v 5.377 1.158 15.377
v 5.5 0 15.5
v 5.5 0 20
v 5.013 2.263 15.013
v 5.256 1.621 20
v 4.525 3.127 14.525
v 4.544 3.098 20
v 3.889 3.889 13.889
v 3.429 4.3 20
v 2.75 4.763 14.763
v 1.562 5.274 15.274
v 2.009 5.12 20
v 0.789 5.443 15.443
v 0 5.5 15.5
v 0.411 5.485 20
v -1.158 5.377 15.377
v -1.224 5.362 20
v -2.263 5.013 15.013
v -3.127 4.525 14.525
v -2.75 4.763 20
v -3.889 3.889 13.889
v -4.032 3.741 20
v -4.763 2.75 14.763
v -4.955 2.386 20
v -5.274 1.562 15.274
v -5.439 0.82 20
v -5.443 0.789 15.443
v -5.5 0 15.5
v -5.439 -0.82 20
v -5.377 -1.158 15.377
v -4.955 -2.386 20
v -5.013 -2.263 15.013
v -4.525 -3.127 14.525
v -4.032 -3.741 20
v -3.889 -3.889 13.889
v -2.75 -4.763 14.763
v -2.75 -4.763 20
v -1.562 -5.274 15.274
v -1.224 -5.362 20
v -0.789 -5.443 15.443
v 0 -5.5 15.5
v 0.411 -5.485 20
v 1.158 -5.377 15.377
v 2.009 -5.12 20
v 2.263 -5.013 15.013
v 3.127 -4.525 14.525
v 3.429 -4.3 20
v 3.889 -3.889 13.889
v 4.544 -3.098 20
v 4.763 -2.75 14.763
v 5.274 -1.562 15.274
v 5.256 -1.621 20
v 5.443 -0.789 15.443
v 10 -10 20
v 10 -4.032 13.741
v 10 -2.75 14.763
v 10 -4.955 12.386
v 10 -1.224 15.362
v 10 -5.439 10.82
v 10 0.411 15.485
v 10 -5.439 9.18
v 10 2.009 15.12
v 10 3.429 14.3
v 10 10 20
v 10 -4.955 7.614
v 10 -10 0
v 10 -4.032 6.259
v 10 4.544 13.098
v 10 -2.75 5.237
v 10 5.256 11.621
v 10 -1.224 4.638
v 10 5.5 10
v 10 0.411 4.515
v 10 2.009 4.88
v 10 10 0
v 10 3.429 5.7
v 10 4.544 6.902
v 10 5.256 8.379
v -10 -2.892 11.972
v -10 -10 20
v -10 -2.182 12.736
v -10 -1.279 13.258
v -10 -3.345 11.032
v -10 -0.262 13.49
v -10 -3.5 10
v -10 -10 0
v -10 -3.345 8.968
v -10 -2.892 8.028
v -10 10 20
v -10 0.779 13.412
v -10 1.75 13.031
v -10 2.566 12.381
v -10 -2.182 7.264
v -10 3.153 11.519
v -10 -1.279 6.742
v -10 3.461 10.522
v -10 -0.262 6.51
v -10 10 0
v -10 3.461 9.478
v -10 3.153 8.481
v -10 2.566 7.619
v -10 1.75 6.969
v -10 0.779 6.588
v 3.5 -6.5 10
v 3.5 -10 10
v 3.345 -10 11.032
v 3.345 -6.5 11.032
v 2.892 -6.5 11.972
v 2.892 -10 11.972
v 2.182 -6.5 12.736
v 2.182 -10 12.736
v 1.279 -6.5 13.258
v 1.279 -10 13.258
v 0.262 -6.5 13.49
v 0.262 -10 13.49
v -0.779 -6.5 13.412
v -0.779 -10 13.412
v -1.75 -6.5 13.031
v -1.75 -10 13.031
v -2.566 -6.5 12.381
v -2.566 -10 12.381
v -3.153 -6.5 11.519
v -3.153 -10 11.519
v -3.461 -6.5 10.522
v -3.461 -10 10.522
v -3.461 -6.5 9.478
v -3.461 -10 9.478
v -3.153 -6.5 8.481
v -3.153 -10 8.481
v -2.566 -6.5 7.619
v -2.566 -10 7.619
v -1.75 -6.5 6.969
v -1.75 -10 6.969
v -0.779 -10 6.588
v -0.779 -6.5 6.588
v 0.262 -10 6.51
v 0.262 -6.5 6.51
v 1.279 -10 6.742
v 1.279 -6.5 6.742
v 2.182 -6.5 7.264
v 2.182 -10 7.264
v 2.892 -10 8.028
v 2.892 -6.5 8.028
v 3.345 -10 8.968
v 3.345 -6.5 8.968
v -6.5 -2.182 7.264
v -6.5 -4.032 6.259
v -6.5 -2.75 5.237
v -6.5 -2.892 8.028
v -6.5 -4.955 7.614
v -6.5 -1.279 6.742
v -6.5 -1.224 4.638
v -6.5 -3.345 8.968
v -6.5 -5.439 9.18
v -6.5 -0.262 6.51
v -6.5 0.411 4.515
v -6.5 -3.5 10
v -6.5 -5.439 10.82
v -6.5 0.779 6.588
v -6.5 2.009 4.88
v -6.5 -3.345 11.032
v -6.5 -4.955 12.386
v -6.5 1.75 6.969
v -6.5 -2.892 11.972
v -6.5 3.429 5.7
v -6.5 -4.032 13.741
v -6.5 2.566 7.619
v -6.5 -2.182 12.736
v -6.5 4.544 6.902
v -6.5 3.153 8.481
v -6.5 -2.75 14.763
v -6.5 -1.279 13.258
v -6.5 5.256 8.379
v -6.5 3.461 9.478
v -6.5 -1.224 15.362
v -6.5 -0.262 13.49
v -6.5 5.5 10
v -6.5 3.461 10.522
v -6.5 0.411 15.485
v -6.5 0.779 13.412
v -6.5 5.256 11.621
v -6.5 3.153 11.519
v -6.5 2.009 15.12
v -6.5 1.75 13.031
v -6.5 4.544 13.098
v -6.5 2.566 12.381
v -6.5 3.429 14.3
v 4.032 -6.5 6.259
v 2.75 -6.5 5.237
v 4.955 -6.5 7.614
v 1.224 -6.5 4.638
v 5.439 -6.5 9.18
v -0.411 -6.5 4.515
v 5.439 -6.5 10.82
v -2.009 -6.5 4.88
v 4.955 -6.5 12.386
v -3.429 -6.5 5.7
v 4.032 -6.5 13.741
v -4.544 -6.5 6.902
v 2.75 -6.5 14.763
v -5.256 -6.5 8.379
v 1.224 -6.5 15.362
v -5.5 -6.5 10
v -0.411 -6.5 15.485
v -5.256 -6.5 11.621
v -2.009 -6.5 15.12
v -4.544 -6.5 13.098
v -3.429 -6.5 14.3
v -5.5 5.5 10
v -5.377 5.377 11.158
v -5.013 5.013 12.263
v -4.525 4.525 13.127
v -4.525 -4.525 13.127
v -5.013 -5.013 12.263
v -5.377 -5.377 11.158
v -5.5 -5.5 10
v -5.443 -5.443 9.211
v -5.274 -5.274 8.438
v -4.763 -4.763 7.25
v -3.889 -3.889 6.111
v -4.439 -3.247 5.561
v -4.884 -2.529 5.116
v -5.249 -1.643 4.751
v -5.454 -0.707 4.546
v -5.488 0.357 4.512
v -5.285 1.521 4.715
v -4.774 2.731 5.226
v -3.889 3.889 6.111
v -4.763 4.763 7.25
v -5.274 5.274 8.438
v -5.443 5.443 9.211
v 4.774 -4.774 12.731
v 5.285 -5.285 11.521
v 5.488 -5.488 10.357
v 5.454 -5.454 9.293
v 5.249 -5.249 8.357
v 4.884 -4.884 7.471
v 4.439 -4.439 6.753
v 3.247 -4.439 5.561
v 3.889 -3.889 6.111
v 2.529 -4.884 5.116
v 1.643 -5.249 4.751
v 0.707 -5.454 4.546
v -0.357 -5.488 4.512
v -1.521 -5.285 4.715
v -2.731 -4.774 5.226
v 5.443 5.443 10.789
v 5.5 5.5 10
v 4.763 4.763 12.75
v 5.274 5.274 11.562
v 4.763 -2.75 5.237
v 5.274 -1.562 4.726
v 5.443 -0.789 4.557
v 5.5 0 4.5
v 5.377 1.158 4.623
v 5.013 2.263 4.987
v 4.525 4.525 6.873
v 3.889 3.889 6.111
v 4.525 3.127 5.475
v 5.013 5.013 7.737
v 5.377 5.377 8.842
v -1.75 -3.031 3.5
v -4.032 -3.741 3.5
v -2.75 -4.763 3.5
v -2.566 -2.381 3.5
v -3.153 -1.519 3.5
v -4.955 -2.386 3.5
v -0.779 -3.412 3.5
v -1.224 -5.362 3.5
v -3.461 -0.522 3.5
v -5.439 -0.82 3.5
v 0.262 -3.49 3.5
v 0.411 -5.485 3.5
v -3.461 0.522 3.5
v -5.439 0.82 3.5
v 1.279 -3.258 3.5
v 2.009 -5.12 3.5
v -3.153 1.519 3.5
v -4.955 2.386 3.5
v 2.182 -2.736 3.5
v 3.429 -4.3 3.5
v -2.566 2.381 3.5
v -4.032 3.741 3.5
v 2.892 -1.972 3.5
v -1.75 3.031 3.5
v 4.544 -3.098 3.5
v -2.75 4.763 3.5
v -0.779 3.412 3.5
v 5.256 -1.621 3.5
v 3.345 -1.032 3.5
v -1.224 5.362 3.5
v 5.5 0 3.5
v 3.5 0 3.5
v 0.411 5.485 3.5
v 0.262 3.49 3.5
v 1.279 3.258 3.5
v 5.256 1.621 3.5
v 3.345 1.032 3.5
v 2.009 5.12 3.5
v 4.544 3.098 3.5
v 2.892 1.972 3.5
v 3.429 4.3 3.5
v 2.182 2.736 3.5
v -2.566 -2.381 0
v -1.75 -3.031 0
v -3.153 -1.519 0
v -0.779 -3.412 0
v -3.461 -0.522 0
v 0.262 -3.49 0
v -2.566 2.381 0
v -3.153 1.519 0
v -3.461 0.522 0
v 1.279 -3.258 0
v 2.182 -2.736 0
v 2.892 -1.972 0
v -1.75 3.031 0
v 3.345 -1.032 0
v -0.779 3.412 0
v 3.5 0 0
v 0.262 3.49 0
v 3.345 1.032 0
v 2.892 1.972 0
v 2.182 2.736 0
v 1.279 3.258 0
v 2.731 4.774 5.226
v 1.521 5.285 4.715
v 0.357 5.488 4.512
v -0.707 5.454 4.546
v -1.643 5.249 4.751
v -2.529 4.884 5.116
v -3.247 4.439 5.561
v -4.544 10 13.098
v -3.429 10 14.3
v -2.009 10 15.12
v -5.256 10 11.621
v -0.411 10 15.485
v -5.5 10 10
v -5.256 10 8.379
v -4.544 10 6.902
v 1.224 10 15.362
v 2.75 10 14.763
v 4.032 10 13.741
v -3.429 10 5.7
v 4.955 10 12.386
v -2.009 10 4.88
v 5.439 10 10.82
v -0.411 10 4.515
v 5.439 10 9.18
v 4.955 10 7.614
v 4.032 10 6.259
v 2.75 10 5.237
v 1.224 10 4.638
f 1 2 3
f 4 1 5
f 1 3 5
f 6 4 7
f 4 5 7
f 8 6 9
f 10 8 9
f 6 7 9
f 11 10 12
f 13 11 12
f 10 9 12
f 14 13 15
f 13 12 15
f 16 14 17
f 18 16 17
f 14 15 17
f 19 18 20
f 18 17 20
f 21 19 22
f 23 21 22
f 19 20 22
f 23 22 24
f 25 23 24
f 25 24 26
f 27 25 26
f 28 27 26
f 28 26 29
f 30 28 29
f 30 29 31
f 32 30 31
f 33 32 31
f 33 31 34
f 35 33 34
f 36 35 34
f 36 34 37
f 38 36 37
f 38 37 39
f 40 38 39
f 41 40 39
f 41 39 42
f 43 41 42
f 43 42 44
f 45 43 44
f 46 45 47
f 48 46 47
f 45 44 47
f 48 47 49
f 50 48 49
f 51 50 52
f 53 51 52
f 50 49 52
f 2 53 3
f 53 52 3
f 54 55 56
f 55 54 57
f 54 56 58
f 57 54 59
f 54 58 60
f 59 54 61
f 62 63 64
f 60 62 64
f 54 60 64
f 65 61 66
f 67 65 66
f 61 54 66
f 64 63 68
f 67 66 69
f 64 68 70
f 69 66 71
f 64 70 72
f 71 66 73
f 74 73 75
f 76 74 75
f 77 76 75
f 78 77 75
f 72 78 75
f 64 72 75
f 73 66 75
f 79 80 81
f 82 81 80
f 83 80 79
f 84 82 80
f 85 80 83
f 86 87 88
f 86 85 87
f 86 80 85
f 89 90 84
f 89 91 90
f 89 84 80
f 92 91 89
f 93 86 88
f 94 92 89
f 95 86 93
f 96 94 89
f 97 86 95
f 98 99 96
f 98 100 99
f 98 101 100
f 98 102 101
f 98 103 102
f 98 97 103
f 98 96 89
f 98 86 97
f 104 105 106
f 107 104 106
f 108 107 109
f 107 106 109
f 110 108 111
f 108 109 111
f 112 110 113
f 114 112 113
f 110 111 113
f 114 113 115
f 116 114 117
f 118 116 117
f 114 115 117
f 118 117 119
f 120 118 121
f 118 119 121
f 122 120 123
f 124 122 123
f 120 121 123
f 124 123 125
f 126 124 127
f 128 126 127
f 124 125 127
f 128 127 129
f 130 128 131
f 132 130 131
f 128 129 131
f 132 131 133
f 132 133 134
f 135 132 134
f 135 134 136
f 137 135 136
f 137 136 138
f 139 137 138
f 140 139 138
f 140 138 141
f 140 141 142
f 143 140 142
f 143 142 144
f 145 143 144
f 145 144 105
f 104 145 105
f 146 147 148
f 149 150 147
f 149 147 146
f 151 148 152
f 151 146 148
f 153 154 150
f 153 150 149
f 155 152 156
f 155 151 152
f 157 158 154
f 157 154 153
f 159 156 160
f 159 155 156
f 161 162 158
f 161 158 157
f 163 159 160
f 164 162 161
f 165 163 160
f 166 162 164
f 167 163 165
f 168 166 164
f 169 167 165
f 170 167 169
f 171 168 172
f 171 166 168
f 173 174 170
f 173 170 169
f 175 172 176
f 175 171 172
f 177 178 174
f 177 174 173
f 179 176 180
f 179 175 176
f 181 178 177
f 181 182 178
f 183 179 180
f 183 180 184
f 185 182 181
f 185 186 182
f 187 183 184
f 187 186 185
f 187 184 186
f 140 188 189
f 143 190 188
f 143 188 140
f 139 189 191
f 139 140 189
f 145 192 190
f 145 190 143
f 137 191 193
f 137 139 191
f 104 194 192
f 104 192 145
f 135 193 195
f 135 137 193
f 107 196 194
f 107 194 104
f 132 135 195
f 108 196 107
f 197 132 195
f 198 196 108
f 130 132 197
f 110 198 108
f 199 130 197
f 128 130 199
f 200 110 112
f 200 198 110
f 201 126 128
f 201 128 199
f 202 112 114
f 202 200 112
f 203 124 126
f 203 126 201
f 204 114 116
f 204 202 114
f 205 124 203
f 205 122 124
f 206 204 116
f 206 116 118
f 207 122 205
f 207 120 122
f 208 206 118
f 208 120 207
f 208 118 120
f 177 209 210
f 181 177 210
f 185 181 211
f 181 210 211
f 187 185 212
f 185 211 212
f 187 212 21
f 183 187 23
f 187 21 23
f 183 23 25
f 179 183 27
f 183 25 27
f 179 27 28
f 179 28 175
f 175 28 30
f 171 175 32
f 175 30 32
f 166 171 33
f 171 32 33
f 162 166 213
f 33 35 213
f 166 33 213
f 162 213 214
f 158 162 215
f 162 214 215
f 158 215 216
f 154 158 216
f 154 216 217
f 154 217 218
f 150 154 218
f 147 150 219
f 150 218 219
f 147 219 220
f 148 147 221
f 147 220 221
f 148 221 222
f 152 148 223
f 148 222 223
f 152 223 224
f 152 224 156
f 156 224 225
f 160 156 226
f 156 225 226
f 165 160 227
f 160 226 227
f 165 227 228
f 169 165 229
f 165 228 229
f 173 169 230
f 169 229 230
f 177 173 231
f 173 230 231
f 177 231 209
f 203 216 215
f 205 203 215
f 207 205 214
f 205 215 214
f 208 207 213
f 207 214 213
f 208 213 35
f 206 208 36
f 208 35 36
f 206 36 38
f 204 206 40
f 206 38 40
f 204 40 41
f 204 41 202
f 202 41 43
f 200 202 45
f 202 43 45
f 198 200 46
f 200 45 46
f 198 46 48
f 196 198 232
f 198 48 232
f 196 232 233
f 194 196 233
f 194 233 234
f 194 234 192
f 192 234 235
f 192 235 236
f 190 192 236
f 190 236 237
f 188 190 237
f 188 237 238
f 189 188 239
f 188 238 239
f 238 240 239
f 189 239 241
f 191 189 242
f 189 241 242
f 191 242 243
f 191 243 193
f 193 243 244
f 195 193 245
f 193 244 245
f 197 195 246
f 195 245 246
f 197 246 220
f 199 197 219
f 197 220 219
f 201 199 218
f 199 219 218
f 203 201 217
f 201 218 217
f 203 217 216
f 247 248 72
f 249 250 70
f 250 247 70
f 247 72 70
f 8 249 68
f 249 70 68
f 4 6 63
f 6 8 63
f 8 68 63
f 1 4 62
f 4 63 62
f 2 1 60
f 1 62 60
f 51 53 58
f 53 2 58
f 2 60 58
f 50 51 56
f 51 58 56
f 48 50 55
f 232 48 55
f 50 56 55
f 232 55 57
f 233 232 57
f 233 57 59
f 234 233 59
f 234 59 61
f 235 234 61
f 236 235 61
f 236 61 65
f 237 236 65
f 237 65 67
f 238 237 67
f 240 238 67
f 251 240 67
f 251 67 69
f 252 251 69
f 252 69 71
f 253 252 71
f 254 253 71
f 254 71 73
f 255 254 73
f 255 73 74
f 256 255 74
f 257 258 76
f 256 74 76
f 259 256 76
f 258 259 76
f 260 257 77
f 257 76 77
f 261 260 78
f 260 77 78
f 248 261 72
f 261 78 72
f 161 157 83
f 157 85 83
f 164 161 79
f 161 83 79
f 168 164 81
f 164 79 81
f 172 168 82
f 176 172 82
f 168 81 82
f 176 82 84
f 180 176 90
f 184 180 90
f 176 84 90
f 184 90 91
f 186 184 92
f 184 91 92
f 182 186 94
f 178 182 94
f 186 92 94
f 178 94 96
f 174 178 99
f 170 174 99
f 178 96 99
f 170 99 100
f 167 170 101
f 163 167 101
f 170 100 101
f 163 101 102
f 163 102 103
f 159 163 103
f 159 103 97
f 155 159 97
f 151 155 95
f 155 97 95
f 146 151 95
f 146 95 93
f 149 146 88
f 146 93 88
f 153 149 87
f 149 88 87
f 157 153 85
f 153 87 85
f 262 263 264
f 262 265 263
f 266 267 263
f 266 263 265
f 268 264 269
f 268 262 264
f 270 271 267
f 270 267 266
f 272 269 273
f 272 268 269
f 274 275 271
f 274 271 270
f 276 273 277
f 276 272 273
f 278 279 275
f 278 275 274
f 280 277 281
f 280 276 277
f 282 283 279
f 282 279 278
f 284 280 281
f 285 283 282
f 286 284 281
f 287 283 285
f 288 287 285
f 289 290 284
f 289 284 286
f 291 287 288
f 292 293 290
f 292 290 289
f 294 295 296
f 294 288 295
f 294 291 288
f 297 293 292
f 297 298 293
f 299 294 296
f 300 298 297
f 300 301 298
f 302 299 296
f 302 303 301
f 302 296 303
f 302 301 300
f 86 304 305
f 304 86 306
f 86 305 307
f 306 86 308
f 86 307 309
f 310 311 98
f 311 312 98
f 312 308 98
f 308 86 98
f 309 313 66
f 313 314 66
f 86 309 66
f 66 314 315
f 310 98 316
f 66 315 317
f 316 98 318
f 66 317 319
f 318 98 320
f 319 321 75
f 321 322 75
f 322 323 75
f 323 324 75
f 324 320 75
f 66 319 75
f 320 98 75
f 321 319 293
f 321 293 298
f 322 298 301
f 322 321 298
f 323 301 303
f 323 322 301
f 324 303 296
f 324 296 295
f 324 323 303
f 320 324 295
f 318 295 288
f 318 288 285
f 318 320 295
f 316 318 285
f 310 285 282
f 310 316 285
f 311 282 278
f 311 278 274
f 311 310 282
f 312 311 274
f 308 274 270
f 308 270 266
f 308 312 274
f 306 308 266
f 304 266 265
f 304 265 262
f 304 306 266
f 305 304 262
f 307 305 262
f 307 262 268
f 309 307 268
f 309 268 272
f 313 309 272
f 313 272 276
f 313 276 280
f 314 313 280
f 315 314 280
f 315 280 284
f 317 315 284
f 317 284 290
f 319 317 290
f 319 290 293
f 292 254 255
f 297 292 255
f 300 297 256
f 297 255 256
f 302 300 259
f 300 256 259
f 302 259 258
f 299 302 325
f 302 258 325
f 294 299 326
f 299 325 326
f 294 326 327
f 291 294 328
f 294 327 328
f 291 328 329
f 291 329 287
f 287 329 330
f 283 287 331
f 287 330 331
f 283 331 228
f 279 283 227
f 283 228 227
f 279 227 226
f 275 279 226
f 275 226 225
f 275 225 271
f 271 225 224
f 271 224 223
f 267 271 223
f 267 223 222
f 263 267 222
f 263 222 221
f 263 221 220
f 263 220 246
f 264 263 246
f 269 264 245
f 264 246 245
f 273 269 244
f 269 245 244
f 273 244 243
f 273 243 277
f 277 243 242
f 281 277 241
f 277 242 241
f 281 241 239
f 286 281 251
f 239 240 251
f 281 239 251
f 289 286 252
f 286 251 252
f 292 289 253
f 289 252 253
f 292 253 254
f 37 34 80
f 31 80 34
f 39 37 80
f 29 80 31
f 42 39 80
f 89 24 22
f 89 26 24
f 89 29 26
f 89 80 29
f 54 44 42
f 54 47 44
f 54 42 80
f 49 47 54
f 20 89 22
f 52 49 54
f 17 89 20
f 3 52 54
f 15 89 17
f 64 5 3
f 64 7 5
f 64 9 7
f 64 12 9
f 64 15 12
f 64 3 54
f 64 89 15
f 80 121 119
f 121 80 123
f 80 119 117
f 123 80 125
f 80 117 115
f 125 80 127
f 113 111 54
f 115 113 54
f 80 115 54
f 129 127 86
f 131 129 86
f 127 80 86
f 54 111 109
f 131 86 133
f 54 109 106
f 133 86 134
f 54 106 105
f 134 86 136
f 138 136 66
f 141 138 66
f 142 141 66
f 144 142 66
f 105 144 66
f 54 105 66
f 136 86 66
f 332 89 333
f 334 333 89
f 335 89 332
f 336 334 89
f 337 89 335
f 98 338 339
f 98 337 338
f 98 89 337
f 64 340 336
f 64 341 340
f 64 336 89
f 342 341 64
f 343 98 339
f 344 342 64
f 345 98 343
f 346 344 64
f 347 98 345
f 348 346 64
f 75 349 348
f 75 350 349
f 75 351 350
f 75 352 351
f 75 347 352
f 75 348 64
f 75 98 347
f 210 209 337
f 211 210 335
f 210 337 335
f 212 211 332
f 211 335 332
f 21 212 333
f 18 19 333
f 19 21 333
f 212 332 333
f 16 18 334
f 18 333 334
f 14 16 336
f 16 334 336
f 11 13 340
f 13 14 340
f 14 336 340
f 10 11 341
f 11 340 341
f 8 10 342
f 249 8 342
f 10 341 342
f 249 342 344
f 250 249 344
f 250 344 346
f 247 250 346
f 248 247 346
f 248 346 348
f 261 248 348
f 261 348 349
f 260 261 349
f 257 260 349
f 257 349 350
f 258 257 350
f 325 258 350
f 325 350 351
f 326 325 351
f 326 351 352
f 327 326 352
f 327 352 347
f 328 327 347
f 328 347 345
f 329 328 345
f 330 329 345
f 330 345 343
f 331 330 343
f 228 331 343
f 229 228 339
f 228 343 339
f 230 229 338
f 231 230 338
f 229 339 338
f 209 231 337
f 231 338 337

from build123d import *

# Parameters (mm, degrees)
F0_W      = 20
F0_H      = 20
F0_R      = 3.5
F1_DEPTH  = 20
F2_R      = 3.5
F3_DEPTH  = 20
F4_R      = 3.5
F5_DEPTH  = 20
F6_R      = 5.5
F6_R_2    = 3.5
F7_DEPTH  = 16.5
F8_R      = 5.5
F9_DEPTH  = 16.5
F10_R     = 5.5
F11_DEPTH = 16.5


with BuildPart() as f1:
    # F0 (on Top) → F1 (new body)
    with BuildSketch(Plane.XY):
        Rectangle(F0_W, F0_H)
        Circle(F0_R, mode=Mode.SUBTRACT)
    extrude(amount=F1_DEPTH)

    # F2 (on face) → F3 (cut)
    with BuildSketch(Plane.XZ.offset(10)):
        with Locations((0, 10)):
            Circle(F2_R)
    extrude(amount=-F3_DEPTH, mode=Mode.SUBTRACT)

    # F4 (on face) → F5 (cut)
    with BuildSketch(Plane(origin=(-10, 0, 0), x_dir=(0, -1, 0), z_dir=(-1, 0, 0))):
        with Locations((0, 10)):
            Circle(F4_R)
    extrude(amount=-F5_DEPTH, mode=Mode.SUBTRACT)

    # F6 (on face) → F7 (cut)
    with BuildSketch(Plane.XY.offset(20)):
        Circle(F6_R)
        Circle(F6_R_2, mode=Mode.SUBTRACT)
    extrude(amount=-F7_DEPTH, mode=Mode.SUBTRACT)

    # F8 (on face) → F9 (cut)
    with BuildSketch(Plane(origin=(0, 10, 0), x_dir=(-1, 0, 0), z_dir=(0, 1, 0))):
        with Locations((0, 10)):
            Circle(F8_R)
    extrude(amount=-F9_DEPTH, mode=Mode.SUBTRACT)

    # F10 (on face) → F11 (cut)
    with BuildSketch(Plane.YZ.offset(10)):
        with Locations((0, 10)):
            Circle(F10_R)
    extrude(amount=-F11_DEPTH, mode=Mode.SUBTRACT)


solid = f1.part
